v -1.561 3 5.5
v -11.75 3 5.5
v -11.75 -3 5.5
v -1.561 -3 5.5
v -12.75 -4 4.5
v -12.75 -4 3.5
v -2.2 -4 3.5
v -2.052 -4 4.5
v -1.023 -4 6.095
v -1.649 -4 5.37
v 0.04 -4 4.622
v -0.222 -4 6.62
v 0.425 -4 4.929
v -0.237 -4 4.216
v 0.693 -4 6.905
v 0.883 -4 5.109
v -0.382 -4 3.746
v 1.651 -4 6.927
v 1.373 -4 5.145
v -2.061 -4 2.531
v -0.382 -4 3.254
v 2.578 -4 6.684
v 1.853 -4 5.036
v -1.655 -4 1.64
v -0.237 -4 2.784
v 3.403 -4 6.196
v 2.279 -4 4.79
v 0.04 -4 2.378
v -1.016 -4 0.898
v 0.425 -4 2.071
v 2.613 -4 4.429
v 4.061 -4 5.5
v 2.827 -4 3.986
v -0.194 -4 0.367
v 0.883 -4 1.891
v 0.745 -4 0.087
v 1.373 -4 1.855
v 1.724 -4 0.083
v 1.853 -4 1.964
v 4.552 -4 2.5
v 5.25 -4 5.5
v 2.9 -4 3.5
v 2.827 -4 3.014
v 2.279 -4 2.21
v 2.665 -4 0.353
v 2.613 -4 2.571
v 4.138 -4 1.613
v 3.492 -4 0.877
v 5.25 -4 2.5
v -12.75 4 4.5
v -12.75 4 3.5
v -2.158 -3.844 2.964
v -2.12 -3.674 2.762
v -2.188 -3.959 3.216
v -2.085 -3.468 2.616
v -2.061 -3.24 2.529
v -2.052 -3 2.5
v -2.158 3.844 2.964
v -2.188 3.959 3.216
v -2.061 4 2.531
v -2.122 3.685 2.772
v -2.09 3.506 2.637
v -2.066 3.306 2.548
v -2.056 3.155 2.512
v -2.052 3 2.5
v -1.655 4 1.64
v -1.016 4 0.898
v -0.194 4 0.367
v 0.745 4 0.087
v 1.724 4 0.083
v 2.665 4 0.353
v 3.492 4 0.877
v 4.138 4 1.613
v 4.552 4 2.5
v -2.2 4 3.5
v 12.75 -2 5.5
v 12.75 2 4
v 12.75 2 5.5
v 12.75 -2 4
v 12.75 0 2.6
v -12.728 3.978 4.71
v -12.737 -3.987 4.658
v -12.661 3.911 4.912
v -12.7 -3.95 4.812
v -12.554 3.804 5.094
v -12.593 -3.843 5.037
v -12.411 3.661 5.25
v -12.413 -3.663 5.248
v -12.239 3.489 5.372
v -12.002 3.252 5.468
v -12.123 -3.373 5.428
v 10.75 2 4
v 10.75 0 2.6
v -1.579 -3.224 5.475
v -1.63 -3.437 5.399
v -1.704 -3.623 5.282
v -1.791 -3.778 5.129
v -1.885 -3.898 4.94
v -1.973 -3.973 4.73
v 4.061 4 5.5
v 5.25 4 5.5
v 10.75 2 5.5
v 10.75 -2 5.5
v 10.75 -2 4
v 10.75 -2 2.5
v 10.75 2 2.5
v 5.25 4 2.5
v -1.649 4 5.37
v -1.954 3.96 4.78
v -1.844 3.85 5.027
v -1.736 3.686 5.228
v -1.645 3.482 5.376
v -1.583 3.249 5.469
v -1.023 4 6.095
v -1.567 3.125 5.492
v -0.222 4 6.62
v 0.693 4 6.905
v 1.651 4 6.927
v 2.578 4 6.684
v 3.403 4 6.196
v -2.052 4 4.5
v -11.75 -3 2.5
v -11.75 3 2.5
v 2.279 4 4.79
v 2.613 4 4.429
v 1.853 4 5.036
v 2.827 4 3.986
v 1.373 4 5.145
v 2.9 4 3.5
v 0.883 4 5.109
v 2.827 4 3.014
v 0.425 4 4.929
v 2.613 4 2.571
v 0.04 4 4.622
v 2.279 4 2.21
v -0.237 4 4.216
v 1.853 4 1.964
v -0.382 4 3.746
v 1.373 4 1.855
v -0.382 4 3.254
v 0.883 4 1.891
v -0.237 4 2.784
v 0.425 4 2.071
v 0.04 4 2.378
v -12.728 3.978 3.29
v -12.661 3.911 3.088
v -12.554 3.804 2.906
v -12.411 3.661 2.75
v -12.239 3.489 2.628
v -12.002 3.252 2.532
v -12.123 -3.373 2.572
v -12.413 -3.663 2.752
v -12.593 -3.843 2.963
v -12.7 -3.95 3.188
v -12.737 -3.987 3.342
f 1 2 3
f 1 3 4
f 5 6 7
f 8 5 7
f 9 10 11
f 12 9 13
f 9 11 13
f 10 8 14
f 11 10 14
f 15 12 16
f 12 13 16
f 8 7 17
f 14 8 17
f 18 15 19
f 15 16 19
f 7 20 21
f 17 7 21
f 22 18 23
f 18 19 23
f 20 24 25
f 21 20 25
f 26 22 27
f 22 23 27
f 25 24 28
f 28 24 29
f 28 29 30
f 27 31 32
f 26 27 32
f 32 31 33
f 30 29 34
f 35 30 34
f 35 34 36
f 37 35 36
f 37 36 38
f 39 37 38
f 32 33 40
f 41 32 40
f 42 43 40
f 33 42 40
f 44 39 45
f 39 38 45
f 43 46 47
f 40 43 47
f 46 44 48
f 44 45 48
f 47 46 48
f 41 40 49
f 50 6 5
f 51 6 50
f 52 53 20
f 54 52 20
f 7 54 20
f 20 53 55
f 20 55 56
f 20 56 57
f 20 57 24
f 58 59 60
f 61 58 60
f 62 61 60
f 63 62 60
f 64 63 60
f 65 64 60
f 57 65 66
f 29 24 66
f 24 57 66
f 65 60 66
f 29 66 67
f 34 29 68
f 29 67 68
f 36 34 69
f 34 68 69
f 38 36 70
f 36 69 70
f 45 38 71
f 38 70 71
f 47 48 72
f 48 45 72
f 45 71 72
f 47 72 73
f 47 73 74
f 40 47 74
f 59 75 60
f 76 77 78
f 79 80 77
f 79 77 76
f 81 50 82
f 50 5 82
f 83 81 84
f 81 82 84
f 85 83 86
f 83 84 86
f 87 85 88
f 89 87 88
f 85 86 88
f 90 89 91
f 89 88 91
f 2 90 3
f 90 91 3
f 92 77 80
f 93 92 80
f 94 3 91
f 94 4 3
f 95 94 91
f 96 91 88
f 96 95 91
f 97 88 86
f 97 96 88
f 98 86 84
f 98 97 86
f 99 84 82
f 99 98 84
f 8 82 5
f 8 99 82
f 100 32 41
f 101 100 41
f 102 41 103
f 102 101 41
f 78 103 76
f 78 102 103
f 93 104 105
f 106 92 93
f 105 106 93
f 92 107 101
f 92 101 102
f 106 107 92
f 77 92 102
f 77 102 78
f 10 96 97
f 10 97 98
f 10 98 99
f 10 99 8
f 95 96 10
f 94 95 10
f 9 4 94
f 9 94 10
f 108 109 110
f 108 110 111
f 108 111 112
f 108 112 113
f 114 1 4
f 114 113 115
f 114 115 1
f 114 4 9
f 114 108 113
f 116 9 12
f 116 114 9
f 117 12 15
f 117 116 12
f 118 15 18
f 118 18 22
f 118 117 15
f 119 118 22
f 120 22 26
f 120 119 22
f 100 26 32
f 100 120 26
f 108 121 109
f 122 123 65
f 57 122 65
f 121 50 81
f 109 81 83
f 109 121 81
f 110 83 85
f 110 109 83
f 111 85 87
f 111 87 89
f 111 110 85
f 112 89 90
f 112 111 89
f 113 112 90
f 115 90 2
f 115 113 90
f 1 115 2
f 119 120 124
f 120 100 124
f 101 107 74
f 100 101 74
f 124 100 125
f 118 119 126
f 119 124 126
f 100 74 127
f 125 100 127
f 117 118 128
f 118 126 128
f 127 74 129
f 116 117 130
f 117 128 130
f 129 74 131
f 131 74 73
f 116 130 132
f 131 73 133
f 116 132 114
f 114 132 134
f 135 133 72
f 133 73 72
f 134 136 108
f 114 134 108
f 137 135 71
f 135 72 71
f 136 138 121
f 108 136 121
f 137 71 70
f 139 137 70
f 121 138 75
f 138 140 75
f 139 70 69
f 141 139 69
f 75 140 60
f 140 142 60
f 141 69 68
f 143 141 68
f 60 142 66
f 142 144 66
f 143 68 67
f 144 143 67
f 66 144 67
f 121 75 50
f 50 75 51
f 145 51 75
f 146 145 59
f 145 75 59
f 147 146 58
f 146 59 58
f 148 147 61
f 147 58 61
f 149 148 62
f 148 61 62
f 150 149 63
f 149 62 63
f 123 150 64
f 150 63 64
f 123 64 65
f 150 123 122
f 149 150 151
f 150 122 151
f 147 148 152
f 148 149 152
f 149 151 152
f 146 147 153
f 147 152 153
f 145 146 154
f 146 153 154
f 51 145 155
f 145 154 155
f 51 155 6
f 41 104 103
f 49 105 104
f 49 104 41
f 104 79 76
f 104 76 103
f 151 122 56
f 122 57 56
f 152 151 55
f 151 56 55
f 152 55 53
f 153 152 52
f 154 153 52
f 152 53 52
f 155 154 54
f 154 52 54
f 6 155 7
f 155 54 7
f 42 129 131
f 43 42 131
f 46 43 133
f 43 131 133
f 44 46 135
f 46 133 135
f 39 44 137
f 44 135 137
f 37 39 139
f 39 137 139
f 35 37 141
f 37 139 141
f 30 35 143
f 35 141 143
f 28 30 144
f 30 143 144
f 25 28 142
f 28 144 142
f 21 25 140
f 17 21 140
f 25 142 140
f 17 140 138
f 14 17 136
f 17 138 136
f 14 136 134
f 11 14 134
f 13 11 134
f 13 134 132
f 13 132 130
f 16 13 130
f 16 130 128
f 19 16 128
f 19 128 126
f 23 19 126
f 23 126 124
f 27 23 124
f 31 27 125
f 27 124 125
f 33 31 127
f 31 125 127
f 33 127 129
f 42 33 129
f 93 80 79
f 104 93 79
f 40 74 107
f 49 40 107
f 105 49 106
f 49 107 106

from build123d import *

# Parameters (mm, degrees)
BOSS_EXTRUDE1_DEPTH = 7
SKETCH2_R           = 1.65
CUT_EXTRUDE1_DEPTH  = 8
CUT_EXTRUDE2_DEPTH  = 2
FILLET1_R           = 1


with BuildPart() as part:
    # Sketch1 → Boss-Extrude1 (new body)
    with BuildSketch(Plane.XY):
        Polygon((-2.750000021, 4.000000393), (5.249999979, 4.000000393), (10.750000021, 2), (12.750000021, 2), (12.750000021, -1.999999214), (10.750000021, -1.999999214), (5.249999979, -3.999999607), (-2.750000021, -3.999999607), (-12.750000021, -3.999999607), (-12.750000021, 4.000000393), align=None)
    extrude(amount=BOSS_EXTRUDE1_DEPTH)

    # Sketch2 → Cut-Extrude1 (cut)
    with BuildSketch(Plane(origin=(0, 4.000000393, 0), x_dir=(1, 0, 0), z_dir=(0, 1, 0))):
        with Locations((1.249999979, -3.5)):
            Circle(SKETCH2_R)
        with BuildLine():
            Line((-12.750000021, -2.5), (-2.051893418, -2.5))
            ThreePointArc((-2.051893418, -2.5), (1.249999979, -0.05), (4.551893375, -2.5))
            Line((4.551893375, -2.5), (12.750000021, -2.5))
            Line((12.750000021, -2.5), (12.750000021, 0))
            Line((12.750000021, 0), (-12.750000021, 0))
            Line((-12.750000021, 0), (-12.750000021, -2.5))
        make_face()
        with BuildLine():
            Line((-12.750000021, -5.5), (-1.561138581, -5.5))
            ThreePointArc((-1.561138581, -5.5), (1.249999979, -6.95), (4.061138538, -5.5))
            Line((4.061138538, -5.5), (12.750000021, -5.5))
            Line((12.750000021, -5.5), (12.750000021, -7))
            Line((12.750000021, -7), (-12.750000021, -7))
            Line((-12.750000021, -7), (-12.750000021, -5.5))
        make_face()
    extrude(amount=-CUT_EXTRUDE1_DEPTH, mode=Mode.SUBTRACT)

    # Sketch3 → Cut-Extrude2 (cut)
    with BuildSketch(Plane(origin=(12.750000021, 0, 0), x_dir=(0, 0, -1), z_dir=(1, 0, 0))):
        Polygon((-4, 2), (-2.6, 0), (-4, -2), (-2.5, -2), (-2.5, 0), (-2.5, 2), align=None)
    extrude(amount=-CUT_EXTRUDE2_DEPTH, mode=Mode.SUBTRACT)

    # Fillet1
    fillet1_edges = [part.edges().sort_by_distance(p)[0] for p in [
        (-7.40094672, 4.000000393, 2.5),
        (-7.40094672, -3.999999607, 2.5),
        (-12.750000021, 3.93e-07, 2.5),
        (-7.155569301, 4.000000393, 5.5),
        (-7.155569301, -3.999999607, 5.5),
        (-12.750000021, 3.93e-07, 5.5),
    ]]
    fillet(fillet1_edges, radius=FILLET1_R)


solid = part.part
